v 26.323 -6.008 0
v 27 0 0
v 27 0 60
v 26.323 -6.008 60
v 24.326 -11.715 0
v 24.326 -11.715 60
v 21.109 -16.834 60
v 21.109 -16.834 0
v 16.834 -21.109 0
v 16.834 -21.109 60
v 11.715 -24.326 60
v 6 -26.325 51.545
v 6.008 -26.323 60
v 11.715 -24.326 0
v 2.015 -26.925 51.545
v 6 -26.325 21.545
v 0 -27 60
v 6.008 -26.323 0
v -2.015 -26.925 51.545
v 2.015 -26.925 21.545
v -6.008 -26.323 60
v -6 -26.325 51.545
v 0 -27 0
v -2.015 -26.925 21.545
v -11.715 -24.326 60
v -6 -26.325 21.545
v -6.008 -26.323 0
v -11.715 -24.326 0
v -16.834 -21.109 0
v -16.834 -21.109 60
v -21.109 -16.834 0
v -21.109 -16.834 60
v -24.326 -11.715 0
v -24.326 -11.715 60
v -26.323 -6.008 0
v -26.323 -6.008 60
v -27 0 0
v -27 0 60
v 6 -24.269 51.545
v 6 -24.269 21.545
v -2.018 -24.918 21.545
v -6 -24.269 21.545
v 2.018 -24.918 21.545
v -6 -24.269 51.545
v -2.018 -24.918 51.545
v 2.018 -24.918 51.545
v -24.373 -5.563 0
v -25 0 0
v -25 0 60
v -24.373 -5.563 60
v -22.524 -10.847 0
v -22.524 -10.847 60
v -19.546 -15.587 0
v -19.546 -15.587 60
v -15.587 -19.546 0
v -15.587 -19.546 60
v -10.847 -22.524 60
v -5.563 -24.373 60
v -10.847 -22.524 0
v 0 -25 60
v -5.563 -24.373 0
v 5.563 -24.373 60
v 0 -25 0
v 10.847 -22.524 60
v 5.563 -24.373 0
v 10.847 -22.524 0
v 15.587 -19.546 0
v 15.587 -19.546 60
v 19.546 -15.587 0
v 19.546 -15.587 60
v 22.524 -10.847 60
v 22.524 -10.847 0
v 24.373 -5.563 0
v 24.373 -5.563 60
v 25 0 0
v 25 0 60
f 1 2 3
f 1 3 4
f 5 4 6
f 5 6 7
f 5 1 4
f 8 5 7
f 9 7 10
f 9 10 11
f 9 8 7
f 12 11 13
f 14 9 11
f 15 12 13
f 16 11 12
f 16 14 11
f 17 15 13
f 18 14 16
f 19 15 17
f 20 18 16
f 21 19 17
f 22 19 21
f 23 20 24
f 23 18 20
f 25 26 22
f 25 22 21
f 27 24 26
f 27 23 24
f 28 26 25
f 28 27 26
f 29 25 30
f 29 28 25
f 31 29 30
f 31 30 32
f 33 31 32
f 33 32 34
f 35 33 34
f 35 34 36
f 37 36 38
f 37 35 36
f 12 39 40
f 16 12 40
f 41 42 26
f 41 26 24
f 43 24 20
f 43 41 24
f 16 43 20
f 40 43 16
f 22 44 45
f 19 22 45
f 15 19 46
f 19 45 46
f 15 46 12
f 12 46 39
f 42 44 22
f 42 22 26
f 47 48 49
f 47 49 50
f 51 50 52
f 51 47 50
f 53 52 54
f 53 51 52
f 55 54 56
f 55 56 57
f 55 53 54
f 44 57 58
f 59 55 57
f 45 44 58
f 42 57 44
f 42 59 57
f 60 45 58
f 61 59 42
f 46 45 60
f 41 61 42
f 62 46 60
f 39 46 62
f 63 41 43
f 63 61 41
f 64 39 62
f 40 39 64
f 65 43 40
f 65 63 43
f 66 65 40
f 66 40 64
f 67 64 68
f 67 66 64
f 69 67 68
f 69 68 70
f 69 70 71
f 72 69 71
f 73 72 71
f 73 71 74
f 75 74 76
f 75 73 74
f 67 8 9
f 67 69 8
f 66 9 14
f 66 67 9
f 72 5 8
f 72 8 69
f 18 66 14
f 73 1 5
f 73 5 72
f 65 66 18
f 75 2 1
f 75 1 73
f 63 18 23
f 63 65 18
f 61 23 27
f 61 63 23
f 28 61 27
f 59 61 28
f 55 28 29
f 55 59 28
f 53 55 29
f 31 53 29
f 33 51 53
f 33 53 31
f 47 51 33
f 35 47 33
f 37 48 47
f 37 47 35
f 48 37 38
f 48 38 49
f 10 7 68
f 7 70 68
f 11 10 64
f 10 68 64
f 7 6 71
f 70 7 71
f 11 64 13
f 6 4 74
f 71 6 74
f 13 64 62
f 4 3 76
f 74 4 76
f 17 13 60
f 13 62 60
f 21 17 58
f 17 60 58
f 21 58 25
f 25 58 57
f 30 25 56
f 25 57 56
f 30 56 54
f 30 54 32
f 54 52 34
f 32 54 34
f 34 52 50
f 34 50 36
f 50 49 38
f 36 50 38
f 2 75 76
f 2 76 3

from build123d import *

# Parameters (mm, degrees)
BOSS_EXTRU_1_DEPTH      = 60
ESQUISSE2_W             = 12
ESQUISSE2_H             = 30
ENL_V_MAT_EXTRU_1_DEPTH = 72.119617547


with BuildPart() as part:
    # Esquisse1 → Boss.-Extru.1 (new body)
    with BuildSketch(Plane.XY):
        with BuildLine():
            Line((-27, 0), (-25, 0))
            ThreePointArc((-25, 0), (0, -25), (25, 0))
            Line((25, 0), (27, 0))
            ThreePointArc((27, 0), (0, -27), (-27, 0))
        make_face()
    extrude(amount=BOSS_EXTRU_1_DEPTH)

    # Esquisse2 → Enlèv. mat.-Extru.1 (cut, through all)
    with BuildSketch(Plane(origin=(0, 0, 0), x_dir=(1, 0, 0), z_dir=(0, 1, 0))):
        with Locations((0, -36.544954045)):
            Rectangle(ESQUISSE2_W, ESQUISSE2_H)
    extrude(amount=-ENL_V_MAT_EXTRU_1_DEPTH, mode=Mode.SUBTRACT)


solid = part.part
